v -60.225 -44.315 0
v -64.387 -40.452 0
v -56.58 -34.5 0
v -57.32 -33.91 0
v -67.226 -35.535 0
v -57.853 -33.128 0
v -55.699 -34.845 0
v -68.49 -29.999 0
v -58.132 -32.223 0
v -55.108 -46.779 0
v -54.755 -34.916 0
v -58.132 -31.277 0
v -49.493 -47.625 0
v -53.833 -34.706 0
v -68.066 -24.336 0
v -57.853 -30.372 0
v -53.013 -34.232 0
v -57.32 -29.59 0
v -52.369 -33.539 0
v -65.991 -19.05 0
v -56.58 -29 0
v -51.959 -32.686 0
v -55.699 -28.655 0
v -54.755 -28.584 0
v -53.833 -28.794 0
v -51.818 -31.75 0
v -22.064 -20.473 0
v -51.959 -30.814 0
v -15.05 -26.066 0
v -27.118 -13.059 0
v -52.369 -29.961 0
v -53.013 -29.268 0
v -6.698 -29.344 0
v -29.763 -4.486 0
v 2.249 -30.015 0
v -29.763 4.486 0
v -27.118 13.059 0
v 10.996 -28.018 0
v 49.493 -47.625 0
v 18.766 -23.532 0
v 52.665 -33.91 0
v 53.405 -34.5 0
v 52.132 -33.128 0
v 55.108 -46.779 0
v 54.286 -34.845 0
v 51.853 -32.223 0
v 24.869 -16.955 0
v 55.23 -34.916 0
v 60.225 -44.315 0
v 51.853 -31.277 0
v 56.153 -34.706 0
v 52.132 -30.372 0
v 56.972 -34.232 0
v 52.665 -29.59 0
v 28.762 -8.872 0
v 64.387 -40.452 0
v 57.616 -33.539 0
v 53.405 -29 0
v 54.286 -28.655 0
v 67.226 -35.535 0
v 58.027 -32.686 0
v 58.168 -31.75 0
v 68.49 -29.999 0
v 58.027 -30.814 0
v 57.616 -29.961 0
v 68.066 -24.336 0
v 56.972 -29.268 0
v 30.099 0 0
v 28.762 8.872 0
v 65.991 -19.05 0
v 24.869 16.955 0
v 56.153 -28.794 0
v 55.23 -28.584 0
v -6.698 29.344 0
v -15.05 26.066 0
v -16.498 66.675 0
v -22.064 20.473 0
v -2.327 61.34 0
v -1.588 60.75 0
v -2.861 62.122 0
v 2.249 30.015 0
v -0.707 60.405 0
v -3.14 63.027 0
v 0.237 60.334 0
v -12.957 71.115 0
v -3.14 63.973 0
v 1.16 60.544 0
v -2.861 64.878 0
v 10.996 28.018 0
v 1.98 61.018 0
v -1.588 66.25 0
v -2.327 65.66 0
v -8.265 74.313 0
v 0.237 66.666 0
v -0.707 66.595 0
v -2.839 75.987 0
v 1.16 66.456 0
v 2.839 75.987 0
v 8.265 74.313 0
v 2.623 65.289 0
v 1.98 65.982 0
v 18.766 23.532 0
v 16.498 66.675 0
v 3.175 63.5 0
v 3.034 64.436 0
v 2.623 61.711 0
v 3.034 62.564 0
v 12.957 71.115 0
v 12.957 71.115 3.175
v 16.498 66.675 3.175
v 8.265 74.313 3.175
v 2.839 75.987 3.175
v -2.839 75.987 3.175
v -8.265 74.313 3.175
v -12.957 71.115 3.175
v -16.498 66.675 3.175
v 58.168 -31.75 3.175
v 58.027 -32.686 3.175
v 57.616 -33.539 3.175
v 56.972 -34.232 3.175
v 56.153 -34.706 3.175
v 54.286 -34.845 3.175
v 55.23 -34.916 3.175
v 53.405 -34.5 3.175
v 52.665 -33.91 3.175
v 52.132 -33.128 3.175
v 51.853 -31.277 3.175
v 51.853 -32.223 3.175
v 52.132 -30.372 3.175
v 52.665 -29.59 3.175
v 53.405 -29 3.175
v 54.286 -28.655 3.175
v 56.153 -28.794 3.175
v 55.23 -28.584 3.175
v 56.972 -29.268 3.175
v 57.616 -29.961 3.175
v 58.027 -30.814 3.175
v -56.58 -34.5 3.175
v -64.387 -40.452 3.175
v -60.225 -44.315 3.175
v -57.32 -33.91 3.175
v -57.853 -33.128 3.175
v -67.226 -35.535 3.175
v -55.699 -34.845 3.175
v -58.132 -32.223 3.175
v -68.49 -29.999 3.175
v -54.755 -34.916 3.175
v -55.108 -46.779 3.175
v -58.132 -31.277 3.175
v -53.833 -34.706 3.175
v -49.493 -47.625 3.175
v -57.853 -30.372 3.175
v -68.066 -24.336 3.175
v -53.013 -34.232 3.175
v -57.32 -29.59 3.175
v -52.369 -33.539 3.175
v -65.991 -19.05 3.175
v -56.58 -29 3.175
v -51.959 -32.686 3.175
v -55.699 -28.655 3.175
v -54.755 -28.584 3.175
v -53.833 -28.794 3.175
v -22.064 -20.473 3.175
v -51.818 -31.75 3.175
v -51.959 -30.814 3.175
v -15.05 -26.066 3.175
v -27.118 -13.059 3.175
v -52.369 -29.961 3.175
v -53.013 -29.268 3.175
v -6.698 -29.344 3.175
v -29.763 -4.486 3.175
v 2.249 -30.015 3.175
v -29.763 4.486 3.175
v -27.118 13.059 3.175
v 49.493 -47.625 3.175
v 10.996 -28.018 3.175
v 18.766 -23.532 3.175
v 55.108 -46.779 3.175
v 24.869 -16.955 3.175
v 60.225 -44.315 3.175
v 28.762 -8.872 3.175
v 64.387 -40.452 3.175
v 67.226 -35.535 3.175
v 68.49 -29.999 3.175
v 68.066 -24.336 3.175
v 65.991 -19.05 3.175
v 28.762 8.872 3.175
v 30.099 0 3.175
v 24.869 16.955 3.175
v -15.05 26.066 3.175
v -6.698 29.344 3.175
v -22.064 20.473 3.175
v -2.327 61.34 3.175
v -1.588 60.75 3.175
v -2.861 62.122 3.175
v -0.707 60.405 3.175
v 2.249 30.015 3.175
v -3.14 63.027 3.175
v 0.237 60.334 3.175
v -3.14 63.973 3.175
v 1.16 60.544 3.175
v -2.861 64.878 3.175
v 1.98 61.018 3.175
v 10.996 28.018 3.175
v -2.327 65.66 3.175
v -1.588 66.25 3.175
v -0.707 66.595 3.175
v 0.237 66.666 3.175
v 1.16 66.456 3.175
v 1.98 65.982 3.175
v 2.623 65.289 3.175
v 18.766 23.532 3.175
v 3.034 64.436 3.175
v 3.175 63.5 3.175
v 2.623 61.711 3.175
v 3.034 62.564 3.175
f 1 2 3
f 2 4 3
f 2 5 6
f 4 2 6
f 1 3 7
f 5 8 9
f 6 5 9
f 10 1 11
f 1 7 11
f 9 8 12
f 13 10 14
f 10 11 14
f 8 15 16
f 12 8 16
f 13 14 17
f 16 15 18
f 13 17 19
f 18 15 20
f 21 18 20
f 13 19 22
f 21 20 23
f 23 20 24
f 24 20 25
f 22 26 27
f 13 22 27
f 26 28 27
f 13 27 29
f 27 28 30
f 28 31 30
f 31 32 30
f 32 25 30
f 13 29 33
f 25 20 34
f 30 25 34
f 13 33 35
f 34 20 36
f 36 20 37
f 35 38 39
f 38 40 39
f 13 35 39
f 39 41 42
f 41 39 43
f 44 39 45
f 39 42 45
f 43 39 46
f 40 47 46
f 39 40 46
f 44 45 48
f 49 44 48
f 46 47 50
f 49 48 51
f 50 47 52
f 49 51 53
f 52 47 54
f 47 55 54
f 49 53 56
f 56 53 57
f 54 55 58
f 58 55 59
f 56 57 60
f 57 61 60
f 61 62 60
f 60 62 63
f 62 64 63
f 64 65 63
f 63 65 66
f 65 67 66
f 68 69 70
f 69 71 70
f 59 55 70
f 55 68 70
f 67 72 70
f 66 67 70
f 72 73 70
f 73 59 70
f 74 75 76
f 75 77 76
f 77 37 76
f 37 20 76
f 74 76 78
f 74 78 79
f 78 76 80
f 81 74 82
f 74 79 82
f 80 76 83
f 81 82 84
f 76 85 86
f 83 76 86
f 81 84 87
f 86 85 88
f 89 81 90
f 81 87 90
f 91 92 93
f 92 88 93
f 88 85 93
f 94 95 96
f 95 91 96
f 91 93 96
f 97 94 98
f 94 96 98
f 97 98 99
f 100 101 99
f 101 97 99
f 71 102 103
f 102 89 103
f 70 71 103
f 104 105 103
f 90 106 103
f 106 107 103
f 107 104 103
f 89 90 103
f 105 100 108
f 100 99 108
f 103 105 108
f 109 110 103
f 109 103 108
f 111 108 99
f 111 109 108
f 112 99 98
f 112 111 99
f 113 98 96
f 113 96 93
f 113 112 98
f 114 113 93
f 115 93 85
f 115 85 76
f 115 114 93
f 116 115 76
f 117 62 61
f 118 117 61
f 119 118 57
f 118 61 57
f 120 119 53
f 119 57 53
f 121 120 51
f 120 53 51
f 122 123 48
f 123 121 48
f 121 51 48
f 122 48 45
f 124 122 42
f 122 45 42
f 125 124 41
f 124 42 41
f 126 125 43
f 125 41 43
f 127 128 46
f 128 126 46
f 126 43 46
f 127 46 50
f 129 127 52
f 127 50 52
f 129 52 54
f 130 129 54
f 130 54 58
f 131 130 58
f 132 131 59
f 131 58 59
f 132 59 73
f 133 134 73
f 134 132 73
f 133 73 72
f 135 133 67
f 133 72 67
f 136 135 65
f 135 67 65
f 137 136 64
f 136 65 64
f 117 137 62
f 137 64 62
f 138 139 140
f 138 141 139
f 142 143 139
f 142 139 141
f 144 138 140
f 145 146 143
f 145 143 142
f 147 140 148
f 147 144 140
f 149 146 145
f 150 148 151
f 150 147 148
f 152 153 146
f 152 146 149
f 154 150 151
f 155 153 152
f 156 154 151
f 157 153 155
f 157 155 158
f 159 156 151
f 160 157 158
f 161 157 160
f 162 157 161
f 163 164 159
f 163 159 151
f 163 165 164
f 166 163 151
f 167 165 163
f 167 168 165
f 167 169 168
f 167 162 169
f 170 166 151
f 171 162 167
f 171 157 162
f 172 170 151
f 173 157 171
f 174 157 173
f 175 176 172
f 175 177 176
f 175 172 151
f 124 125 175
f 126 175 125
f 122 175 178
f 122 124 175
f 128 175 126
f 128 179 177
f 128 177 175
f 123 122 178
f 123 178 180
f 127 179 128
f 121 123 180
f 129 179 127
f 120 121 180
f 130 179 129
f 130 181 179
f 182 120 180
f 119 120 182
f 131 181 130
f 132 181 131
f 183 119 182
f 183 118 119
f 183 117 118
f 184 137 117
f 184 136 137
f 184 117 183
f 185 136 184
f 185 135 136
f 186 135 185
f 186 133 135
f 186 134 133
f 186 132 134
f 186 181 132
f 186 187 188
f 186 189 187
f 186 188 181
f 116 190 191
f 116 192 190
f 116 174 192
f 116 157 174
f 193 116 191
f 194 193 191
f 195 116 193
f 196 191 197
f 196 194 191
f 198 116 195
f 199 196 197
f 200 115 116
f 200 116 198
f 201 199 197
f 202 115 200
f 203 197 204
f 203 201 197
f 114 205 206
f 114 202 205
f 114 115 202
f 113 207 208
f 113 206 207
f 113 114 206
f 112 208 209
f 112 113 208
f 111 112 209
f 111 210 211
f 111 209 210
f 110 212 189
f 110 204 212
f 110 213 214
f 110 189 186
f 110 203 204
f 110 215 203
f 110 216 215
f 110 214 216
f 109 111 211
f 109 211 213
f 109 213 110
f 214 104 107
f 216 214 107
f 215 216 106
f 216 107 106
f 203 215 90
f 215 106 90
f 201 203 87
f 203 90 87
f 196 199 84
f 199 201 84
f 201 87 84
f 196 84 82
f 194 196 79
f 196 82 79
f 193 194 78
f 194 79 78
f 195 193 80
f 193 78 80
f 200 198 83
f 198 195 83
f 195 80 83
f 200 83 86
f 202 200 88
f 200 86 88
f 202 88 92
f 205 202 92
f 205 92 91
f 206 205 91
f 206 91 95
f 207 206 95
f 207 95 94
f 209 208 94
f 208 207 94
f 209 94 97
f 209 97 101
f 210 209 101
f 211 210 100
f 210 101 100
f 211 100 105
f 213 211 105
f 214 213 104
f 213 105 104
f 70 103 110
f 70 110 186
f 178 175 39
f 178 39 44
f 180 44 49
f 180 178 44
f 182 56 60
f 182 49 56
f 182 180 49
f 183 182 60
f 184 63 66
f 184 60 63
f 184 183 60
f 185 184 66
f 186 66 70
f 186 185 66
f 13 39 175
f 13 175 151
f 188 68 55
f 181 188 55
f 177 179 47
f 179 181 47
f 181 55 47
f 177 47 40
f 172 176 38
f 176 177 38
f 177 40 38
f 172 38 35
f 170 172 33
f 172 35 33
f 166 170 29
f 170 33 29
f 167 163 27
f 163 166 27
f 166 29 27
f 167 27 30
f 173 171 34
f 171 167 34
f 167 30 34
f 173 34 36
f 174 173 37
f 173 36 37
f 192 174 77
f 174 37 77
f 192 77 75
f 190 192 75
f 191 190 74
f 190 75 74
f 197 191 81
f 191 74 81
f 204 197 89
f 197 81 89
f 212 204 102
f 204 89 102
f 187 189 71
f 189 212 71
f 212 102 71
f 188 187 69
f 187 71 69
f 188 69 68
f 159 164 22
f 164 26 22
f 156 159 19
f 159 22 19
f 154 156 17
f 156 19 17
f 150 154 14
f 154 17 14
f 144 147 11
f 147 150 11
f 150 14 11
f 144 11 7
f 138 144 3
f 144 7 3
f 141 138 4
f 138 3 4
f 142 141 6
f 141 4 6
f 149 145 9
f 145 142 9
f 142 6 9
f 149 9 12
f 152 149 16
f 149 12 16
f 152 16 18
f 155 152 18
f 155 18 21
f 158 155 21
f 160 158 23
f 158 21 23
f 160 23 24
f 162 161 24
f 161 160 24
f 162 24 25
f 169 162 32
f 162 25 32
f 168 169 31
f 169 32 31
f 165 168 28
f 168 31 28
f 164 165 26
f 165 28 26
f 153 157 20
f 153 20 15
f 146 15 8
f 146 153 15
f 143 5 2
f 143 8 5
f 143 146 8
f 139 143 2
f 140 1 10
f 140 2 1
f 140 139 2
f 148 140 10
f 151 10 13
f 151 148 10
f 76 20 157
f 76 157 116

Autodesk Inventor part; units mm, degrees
ref_plane "YZ Plane" through (0, 0, 0) normal (1, 0, 0) x (0, 1, 0)
ref_plane "XZ Plane" through (0, 0, 0) normal (0, 1, 0) x (-1, 0, 0)
ref_plane "XY Plane" through (0, 0, 0) normal (0, 0, 1) x (1, 0, 0)
sketch "Sketch2" plane through (0, 0, 0) normal (0, 0, 1) x (1, 0, 0)
  circle A0 centre (0, 0) radius 30.099
  circle A1 centre (0, 63.5) radius 3.175
  circle A2 centre (-54.9926, -31.75) radius 3.175
  circle A3 centre (54.9926, -31.75) radius 3.175
  line L0 (0, 69.85) -> (60.4919, -34.925) construction
  line L1 (60.4919, -34.925) -> (-60.4919, -34.925) construction
  line L2 (-60.4919, -34.925) -> (0, 69.85) construction
  line L3 (0, 95.25) -> (82.4889, -47.625)
  line L4 (82.4889, -47.625) -> (-82.4889, -47.625)
  line L5 (-82.4889, -47.625) -> (0, 95.25)
  dimension "d0" = 60.198
  dimension "d1" = 6.35
  dimension "d2" = 63.5
  dimension "d5" = 360
  dimension "d8" = 12.7
  dimension "d9" = 12.7
  dimension "d10" = 12.7
extrude "Extrusion1" add sketch "Sketch2" along normal blind 3.175
fillet "Fillet1" radius 19.05 3 edges at (0, 95.25, 1.5875) (-82.4889, -47.625, 1.5875) (82.4889, -47.625, 1.5875)
properties part number "Triangle-PVC-hole"
